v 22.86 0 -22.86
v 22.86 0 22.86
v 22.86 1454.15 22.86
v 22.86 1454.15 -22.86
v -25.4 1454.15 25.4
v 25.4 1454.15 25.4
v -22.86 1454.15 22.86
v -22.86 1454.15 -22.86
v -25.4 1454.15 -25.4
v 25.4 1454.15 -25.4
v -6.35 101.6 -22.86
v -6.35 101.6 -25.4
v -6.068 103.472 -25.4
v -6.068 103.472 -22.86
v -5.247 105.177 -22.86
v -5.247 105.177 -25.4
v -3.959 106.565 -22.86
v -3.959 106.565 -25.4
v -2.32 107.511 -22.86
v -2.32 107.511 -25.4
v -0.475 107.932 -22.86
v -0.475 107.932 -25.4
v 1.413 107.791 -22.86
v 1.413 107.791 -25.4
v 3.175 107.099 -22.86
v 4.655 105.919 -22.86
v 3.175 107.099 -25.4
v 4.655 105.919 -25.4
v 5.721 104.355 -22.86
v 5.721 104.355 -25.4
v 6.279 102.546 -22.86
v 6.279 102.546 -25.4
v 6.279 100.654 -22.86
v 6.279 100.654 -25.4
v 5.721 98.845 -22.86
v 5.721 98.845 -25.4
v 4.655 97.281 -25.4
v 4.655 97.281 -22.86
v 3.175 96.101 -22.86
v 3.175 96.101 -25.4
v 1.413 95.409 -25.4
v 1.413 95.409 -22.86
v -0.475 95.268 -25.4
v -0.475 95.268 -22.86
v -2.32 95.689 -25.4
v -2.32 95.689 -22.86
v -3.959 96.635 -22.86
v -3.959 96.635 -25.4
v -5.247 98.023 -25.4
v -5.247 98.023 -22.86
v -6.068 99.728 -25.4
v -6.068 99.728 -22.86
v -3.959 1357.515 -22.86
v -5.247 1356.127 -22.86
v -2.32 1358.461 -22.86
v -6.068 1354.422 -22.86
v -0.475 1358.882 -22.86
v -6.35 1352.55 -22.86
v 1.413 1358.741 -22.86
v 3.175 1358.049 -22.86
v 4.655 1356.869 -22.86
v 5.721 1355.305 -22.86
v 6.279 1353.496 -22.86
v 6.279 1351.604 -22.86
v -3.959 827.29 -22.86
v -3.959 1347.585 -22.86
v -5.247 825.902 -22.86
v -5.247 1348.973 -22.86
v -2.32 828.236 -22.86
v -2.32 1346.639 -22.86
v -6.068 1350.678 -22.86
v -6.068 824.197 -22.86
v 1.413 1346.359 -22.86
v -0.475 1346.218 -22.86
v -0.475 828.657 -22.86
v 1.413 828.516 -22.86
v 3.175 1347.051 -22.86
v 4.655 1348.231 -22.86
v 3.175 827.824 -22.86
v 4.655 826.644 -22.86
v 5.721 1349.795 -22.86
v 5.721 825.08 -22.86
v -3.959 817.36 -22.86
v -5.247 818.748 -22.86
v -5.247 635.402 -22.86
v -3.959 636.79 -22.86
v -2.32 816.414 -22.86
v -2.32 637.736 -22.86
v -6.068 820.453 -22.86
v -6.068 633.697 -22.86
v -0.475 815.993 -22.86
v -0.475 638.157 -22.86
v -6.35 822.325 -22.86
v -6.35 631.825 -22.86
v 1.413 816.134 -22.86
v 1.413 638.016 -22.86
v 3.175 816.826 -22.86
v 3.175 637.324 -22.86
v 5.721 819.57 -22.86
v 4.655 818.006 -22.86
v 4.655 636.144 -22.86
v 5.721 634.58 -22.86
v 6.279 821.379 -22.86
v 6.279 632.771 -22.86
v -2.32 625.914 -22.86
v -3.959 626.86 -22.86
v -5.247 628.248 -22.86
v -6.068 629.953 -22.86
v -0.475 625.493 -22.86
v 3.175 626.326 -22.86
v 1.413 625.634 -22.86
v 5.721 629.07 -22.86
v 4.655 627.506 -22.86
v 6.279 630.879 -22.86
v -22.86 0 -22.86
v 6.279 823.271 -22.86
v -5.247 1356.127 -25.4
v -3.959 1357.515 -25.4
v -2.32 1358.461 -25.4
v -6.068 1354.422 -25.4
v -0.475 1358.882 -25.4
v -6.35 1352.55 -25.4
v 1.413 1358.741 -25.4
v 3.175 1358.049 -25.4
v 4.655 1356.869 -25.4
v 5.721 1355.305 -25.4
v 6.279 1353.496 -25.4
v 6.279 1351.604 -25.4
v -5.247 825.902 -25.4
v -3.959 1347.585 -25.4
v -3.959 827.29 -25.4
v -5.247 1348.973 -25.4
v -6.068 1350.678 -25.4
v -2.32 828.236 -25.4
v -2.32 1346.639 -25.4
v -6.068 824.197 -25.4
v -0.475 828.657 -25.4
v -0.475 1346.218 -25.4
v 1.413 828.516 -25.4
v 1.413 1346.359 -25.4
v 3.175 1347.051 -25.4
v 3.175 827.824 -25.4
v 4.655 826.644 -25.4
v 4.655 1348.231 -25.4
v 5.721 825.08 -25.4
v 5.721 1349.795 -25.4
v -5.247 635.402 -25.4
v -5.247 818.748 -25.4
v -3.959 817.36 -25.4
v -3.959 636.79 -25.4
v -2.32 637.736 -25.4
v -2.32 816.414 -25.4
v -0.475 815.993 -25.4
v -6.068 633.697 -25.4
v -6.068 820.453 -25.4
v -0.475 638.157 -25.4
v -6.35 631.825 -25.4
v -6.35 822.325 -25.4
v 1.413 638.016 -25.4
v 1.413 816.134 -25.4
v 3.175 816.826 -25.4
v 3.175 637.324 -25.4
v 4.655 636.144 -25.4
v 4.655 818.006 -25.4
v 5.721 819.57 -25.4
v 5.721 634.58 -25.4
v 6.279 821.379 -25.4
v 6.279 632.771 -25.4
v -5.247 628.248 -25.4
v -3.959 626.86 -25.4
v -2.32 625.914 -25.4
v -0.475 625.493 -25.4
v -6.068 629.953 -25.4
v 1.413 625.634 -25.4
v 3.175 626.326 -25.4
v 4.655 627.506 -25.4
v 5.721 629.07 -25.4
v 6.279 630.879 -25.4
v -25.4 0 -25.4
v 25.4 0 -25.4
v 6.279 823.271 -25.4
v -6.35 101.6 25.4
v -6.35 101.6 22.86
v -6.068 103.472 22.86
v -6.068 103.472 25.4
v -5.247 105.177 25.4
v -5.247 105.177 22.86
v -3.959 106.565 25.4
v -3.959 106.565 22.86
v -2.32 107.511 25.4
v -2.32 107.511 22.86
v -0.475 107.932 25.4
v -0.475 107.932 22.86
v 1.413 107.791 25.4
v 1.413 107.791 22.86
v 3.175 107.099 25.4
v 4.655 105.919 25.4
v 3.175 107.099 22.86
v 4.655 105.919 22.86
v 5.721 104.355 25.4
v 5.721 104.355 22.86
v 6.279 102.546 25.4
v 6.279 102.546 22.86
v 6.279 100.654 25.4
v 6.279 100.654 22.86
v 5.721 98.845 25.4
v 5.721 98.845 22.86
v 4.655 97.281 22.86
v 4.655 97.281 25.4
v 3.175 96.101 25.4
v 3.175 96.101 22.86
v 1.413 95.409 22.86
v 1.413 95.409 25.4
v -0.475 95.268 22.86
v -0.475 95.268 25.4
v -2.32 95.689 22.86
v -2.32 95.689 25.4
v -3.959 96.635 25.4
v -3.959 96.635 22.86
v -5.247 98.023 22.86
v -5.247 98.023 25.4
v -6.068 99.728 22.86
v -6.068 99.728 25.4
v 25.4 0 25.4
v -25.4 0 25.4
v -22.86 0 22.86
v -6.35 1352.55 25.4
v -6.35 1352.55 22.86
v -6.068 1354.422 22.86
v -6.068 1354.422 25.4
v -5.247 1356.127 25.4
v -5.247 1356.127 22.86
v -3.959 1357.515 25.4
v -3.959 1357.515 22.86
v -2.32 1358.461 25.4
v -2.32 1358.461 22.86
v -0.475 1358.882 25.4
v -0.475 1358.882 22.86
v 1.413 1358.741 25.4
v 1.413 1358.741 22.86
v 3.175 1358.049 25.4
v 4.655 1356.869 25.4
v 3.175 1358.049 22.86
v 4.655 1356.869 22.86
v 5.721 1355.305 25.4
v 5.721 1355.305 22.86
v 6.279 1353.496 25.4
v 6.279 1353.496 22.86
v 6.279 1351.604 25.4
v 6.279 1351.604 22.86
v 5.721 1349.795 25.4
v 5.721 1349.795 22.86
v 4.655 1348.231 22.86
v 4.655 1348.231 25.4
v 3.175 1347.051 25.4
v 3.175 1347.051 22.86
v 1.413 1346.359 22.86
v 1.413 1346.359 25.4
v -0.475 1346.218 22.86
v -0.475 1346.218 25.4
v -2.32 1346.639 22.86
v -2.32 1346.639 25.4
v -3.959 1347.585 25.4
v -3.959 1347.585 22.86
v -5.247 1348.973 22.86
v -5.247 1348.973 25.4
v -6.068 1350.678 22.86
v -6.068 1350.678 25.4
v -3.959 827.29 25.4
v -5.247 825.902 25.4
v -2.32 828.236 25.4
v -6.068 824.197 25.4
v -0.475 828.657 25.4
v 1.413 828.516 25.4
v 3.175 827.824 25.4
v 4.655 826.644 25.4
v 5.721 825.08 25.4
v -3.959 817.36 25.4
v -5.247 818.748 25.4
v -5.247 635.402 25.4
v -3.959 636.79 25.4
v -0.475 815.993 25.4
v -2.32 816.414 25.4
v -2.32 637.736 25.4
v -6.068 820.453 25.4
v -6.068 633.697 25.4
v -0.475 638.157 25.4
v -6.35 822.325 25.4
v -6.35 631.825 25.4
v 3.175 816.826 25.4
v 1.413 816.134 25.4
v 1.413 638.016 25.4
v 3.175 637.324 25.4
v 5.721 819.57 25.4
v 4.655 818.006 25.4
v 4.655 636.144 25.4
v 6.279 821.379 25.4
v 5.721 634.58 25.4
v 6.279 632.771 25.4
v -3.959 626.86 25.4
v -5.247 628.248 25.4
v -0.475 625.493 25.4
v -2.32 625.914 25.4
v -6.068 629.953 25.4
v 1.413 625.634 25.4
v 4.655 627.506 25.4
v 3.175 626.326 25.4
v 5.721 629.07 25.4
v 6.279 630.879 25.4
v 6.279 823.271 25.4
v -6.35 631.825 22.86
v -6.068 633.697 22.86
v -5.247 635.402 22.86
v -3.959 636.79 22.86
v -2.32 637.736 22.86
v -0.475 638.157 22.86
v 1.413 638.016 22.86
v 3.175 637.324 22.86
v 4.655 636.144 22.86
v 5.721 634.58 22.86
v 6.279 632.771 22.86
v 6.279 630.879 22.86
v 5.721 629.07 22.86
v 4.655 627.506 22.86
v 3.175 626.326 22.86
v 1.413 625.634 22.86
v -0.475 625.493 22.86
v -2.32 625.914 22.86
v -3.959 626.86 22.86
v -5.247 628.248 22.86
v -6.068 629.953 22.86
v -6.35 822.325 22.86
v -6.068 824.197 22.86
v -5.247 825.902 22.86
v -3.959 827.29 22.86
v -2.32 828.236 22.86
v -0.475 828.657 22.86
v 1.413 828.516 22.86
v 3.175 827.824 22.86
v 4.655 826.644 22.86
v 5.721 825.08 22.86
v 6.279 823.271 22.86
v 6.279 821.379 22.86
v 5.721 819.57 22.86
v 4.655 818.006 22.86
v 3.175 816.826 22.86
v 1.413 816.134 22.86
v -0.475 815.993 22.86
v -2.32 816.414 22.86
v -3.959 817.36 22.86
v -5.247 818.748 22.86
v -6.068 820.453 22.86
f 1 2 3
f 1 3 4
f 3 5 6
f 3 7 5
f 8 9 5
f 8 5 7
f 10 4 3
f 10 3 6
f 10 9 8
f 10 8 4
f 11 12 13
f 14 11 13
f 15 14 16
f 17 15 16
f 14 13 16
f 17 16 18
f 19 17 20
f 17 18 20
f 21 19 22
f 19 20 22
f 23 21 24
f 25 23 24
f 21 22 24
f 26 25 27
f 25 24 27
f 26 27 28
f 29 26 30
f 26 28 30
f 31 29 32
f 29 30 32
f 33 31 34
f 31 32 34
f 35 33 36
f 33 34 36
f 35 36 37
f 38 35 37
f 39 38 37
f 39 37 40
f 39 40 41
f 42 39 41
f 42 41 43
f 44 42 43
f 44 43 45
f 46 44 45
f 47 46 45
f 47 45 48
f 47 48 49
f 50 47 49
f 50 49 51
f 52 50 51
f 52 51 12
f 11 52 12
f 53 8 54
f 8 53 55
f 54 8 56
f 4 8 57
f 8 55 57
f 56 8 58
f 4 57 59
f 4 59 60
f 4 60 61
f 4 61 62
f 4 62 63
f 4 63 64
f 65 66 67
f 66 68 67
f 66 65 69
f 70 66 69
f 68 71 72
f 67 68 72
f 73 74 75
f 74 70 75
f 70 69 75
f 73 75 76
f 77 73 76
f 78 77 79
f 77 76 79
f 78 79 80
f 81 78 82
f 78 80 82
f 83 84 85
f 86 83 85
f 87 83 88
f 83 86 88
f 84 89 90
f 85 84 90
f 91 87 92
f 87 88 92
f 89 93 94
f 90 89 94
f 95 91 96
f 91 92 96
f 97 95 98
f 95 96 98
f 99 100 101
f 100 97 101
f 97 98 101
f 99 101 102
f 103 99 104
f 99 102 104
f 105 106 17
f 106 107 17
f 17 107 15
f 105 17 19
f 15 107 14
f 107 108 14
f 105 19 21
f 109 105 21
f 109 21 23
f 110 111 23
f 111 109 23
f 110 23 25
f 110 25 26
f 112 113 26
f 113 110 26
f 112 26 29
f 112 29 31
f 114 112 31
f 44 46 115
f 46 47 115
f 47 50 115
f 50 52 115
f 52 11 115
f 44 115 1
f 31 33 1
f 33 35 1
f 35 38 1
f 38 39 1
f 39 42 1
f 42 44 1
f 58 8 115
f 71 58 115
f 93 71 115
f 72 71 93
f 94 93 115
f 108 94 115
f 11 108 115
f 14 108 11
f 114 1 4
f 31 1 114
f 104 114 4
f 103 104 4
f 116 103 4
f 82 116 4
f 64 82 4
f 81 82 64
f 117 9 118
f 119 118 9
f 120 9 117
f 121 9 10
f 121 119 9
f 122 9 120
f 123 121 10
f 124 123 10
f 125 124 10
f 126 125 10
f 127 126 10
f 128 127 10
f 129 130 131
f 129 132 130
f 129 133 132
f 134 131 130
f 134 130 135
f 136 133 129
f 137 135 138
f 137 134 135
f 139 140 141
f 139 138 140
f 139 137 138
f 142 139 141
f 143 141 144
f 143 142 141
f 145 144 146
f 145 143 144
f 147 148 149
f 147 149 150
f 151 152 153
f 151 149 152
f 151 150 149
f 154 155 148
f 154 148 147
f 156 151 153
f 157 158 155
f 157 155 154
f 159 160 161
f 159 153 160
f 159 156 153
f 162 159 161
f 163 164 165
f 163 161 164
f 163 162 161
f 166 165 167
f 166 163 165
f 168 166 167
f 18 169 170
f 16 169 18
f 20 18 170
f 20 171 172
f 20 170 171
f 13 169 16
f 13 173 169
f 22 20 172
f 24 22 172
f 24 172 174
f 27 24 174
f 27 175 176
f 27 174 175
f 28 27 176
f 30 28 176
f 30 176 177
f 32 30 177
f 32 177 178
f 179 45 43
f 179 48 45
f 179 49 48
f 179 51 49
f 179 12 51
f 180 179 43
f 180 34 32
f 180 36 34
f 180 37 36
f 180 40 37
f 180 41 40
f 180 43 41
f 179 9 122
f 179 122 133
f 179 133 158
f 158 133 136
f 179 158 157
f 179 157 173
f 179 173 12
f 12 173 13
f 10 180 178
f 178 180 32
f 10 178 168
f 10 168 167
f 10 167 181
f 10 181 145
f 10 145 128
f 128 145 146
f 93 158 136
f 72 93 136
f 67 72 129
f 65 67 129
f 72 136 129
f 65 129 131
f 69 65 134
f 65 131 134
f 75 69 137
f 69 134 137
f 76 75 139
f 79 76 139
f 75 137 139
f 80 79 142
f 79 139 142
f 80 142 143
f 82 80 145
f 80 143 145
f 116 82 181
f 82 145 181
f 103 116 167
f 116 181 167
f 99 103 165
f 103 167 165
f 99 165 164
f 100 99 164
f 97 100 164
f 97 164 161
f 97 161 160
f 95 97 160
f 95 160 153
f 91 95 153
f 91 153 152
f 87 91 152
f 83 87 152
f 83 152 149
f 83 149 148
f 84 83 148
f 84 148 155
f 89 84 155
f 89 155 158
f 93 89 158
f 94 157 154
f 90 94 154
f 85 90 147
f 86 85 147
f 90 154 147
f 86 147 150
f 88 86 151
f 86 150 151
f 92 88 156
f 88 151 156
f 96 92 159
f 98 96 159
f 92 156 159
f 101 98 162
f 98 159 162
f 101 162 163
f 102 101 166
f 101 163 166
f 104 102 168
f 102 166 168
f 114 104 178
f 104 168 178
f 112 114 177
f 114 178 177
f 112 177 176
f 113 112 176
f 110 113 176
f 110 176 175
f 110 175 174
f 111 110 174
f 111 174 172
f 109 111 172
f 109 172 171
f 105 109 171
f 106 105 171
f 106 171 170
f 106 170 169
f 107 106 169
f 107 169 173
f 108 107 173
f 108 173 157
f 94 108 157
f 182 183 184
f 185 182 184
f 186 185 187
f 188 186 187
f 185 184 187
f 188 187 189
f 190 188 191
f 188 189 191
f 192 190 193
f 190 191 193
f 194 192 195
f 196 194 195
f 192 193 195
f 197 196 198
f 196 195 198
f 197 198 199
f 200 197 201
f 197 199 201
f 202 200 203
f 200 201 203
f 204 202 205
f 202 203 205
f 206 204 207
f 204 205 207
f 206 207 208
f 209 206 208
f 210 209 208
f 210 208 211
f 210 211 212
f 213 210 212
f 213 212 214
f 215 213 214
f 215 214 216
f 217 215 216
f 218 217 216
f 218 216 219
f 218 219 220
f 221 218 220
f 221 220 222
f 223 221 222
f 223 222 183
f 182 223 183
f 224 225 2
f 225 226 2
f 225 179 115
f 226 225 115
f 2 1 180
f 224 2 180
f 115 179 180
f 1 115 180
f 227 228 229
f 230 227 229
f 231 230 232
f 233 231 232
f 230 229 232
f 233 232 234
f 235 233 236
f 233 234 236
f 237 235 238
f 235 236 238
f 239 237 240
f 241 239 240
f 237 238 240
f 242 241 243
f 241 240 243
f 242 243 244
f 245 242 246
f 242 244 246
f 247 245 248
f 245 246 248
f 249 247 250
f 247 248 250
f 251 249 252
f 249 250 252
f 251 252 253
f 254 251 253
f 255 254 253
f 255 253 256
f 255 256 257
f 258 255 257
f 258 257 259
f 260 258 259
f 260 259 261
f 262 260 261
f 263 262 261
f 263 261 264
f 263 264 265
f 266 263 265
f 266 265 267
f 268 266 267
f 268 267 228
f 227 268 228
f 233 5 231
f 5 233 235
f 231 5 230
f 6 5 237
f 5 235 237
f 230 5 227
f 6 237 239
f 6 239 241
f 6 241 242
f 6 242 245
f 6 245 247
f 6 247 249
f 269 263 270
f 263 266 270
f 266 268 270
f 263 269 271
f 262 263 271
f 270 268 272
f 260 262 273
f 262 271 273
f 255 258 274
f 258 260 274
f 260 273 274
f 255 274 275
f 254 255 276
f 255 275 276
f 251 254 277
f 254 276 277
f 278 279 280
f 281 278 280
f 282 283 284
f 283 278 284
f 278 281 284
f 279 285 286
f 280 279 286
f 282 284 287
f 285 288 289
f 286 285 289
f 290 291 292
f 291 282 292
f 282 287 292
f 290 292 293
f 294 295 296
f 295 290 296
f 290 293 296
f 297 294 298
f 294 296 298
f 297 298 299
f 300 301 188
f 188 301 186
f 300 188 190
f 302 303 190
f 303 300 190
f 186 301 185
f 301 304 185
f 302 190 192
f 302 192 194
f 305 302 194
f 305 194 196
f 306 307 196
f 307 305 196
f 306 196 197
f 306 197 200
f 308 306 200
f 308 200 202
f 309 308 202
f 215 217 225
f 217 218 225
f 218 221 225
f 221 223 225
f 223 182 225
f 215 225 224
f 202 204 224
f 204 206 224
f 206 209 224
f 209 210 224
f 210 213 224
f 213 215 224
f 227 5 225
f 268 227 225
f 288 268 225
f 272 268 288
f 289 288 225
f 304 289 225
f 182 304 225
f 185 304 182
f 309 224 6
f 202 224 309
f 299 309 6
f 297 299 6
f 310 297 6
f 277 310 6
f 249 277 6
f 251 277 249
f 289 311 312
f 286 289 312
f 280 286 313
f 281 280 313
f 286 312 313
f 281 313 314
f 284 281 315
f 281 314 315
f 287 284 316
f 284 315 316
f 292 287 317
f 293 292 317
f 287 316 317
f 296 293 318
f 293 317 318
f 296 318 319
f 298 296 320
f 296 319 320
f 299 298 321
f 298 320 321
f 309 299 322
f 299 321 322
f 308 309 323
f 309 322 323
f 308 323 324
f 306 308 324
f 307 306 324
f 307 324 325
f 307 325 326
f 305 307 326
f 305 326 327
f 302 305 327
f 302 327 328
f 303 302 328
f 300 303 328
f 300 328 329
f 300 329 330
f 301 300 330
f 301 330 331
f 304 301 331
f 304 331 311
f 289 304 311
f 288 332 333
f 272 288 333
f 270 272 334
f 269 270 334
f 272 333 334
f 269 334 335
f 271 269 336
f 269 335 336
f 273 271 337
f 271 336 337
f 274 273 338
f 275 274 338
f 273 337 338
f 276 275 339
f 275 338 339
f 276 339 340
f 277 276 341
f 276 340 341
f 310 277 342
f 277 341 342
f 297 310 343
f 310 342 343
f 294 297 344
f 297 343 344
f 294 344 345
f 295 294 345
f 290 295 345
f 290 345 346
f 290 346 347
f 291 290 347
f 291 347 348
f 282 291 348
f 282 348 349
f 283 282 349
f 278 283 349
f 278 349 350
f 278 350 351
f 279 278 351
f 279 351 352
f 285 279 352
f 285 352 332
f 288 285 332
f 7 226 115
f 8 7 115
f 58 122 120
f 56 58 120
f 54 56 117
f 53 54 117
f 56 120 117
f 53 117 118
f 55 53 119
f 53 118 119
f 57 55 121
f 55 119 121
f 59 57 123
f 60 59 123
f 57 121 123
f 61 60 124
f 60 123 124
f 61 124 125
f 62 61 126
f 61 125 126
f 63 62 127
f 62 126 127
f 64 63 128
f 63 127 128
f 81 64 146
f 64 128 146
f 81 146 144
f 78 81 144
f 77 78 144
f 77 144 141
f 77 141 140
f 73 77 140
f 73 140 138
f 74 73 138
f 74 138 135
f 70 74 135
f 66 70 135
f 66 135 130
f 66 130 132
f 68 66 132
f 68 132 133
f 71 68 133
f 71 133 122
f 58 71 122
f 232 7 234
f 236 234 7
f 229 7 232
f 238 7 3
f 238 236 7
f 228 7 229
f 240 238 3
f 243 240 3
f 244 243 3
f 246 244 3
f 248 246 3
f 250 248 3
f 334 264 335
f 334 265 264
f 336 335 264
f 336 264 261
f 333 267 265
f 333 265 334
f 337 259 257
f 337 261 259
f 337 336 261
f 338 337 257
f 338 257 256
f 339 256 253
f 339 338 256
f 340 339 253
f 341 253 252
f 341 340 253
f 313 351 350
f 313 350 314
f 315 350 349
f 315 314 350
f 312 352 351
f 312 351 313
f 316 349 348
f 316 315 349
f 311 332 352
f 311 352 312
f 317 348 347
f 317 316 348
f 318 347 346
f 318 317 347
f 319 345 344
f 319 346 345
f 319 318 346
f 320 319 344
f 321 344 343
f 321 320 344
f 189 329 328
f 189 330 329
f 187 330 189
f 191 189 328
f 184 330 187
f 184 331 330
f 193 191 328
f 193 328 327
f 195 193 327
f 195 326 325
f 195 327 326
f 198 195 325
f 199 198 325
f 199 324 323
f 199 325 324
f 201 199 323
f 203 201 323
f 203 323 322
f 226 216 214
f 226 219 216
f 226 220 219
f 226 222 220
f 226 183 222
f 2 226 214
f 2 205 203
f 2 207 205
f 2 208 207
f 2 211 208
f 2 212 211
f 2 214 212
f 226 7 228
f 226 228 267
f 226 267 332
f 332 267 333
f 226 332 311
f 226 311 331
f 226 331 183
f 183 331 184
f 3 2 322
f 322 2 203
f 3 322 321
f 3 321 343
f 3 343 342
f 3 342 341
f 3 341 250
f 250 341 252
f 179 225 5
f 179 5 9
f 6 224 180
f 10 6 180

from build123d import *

# Parameters (mm, degrees)
SKETCH2_W                 = 50.8
SKETCH2_H                 = 50.8
SKETCH2_W_2               = 45.72
SKETCH2_H_2               = 45.72
BOSS_EXTRUDE2_DEPTH       = 1454.15
F_97_0_5_DIAMETER_HOLE1_D = 12.7
F_97_0_5_DIAMETER_HOLE2_D = 12.7


with BuildPart() as part:
    # Sketch2 → Boss-Extrude2 (new body)
    with BuildSketch(Plane(origin=(0, 0, 0), x_dir=(1, 0, 0), z_dir=(0, 1, 0))):
        Rectangle(SKETCH2_W, SKETCH2_H)
        Rectangle(SKETCH2_W_2, SKETCH2_H_2, mode=Mode.SUBTRACT)
    extrude(amount=BOSS_EXTRUDE2_DEPTH)

    # #97 (0.5) Diameter Hole1 (through all)
    with Locations(Plane(origin=(0, 1352.55, 25.4), x_dir=(1, 0, 0), z_dir=(0, 0, 1))):
        with Locations((0, 0), (0, -1250.95)):
            Hole(F_97_0_5_DIAMETER_HOLE1_D / 2)

    # #97 (0.5) Diameter Hole2 (through all)
    with Locations(Plane(origin=(0, 822.325, 25.4), x_dir=(1, 0, 0), z_dir=(0, 0, 1))):
        with Locations((0, 0), (0, -190.5)):
            Hole(F_97_0_5_DIAMETER_HOLE2_D / 2)


solid = part.part
